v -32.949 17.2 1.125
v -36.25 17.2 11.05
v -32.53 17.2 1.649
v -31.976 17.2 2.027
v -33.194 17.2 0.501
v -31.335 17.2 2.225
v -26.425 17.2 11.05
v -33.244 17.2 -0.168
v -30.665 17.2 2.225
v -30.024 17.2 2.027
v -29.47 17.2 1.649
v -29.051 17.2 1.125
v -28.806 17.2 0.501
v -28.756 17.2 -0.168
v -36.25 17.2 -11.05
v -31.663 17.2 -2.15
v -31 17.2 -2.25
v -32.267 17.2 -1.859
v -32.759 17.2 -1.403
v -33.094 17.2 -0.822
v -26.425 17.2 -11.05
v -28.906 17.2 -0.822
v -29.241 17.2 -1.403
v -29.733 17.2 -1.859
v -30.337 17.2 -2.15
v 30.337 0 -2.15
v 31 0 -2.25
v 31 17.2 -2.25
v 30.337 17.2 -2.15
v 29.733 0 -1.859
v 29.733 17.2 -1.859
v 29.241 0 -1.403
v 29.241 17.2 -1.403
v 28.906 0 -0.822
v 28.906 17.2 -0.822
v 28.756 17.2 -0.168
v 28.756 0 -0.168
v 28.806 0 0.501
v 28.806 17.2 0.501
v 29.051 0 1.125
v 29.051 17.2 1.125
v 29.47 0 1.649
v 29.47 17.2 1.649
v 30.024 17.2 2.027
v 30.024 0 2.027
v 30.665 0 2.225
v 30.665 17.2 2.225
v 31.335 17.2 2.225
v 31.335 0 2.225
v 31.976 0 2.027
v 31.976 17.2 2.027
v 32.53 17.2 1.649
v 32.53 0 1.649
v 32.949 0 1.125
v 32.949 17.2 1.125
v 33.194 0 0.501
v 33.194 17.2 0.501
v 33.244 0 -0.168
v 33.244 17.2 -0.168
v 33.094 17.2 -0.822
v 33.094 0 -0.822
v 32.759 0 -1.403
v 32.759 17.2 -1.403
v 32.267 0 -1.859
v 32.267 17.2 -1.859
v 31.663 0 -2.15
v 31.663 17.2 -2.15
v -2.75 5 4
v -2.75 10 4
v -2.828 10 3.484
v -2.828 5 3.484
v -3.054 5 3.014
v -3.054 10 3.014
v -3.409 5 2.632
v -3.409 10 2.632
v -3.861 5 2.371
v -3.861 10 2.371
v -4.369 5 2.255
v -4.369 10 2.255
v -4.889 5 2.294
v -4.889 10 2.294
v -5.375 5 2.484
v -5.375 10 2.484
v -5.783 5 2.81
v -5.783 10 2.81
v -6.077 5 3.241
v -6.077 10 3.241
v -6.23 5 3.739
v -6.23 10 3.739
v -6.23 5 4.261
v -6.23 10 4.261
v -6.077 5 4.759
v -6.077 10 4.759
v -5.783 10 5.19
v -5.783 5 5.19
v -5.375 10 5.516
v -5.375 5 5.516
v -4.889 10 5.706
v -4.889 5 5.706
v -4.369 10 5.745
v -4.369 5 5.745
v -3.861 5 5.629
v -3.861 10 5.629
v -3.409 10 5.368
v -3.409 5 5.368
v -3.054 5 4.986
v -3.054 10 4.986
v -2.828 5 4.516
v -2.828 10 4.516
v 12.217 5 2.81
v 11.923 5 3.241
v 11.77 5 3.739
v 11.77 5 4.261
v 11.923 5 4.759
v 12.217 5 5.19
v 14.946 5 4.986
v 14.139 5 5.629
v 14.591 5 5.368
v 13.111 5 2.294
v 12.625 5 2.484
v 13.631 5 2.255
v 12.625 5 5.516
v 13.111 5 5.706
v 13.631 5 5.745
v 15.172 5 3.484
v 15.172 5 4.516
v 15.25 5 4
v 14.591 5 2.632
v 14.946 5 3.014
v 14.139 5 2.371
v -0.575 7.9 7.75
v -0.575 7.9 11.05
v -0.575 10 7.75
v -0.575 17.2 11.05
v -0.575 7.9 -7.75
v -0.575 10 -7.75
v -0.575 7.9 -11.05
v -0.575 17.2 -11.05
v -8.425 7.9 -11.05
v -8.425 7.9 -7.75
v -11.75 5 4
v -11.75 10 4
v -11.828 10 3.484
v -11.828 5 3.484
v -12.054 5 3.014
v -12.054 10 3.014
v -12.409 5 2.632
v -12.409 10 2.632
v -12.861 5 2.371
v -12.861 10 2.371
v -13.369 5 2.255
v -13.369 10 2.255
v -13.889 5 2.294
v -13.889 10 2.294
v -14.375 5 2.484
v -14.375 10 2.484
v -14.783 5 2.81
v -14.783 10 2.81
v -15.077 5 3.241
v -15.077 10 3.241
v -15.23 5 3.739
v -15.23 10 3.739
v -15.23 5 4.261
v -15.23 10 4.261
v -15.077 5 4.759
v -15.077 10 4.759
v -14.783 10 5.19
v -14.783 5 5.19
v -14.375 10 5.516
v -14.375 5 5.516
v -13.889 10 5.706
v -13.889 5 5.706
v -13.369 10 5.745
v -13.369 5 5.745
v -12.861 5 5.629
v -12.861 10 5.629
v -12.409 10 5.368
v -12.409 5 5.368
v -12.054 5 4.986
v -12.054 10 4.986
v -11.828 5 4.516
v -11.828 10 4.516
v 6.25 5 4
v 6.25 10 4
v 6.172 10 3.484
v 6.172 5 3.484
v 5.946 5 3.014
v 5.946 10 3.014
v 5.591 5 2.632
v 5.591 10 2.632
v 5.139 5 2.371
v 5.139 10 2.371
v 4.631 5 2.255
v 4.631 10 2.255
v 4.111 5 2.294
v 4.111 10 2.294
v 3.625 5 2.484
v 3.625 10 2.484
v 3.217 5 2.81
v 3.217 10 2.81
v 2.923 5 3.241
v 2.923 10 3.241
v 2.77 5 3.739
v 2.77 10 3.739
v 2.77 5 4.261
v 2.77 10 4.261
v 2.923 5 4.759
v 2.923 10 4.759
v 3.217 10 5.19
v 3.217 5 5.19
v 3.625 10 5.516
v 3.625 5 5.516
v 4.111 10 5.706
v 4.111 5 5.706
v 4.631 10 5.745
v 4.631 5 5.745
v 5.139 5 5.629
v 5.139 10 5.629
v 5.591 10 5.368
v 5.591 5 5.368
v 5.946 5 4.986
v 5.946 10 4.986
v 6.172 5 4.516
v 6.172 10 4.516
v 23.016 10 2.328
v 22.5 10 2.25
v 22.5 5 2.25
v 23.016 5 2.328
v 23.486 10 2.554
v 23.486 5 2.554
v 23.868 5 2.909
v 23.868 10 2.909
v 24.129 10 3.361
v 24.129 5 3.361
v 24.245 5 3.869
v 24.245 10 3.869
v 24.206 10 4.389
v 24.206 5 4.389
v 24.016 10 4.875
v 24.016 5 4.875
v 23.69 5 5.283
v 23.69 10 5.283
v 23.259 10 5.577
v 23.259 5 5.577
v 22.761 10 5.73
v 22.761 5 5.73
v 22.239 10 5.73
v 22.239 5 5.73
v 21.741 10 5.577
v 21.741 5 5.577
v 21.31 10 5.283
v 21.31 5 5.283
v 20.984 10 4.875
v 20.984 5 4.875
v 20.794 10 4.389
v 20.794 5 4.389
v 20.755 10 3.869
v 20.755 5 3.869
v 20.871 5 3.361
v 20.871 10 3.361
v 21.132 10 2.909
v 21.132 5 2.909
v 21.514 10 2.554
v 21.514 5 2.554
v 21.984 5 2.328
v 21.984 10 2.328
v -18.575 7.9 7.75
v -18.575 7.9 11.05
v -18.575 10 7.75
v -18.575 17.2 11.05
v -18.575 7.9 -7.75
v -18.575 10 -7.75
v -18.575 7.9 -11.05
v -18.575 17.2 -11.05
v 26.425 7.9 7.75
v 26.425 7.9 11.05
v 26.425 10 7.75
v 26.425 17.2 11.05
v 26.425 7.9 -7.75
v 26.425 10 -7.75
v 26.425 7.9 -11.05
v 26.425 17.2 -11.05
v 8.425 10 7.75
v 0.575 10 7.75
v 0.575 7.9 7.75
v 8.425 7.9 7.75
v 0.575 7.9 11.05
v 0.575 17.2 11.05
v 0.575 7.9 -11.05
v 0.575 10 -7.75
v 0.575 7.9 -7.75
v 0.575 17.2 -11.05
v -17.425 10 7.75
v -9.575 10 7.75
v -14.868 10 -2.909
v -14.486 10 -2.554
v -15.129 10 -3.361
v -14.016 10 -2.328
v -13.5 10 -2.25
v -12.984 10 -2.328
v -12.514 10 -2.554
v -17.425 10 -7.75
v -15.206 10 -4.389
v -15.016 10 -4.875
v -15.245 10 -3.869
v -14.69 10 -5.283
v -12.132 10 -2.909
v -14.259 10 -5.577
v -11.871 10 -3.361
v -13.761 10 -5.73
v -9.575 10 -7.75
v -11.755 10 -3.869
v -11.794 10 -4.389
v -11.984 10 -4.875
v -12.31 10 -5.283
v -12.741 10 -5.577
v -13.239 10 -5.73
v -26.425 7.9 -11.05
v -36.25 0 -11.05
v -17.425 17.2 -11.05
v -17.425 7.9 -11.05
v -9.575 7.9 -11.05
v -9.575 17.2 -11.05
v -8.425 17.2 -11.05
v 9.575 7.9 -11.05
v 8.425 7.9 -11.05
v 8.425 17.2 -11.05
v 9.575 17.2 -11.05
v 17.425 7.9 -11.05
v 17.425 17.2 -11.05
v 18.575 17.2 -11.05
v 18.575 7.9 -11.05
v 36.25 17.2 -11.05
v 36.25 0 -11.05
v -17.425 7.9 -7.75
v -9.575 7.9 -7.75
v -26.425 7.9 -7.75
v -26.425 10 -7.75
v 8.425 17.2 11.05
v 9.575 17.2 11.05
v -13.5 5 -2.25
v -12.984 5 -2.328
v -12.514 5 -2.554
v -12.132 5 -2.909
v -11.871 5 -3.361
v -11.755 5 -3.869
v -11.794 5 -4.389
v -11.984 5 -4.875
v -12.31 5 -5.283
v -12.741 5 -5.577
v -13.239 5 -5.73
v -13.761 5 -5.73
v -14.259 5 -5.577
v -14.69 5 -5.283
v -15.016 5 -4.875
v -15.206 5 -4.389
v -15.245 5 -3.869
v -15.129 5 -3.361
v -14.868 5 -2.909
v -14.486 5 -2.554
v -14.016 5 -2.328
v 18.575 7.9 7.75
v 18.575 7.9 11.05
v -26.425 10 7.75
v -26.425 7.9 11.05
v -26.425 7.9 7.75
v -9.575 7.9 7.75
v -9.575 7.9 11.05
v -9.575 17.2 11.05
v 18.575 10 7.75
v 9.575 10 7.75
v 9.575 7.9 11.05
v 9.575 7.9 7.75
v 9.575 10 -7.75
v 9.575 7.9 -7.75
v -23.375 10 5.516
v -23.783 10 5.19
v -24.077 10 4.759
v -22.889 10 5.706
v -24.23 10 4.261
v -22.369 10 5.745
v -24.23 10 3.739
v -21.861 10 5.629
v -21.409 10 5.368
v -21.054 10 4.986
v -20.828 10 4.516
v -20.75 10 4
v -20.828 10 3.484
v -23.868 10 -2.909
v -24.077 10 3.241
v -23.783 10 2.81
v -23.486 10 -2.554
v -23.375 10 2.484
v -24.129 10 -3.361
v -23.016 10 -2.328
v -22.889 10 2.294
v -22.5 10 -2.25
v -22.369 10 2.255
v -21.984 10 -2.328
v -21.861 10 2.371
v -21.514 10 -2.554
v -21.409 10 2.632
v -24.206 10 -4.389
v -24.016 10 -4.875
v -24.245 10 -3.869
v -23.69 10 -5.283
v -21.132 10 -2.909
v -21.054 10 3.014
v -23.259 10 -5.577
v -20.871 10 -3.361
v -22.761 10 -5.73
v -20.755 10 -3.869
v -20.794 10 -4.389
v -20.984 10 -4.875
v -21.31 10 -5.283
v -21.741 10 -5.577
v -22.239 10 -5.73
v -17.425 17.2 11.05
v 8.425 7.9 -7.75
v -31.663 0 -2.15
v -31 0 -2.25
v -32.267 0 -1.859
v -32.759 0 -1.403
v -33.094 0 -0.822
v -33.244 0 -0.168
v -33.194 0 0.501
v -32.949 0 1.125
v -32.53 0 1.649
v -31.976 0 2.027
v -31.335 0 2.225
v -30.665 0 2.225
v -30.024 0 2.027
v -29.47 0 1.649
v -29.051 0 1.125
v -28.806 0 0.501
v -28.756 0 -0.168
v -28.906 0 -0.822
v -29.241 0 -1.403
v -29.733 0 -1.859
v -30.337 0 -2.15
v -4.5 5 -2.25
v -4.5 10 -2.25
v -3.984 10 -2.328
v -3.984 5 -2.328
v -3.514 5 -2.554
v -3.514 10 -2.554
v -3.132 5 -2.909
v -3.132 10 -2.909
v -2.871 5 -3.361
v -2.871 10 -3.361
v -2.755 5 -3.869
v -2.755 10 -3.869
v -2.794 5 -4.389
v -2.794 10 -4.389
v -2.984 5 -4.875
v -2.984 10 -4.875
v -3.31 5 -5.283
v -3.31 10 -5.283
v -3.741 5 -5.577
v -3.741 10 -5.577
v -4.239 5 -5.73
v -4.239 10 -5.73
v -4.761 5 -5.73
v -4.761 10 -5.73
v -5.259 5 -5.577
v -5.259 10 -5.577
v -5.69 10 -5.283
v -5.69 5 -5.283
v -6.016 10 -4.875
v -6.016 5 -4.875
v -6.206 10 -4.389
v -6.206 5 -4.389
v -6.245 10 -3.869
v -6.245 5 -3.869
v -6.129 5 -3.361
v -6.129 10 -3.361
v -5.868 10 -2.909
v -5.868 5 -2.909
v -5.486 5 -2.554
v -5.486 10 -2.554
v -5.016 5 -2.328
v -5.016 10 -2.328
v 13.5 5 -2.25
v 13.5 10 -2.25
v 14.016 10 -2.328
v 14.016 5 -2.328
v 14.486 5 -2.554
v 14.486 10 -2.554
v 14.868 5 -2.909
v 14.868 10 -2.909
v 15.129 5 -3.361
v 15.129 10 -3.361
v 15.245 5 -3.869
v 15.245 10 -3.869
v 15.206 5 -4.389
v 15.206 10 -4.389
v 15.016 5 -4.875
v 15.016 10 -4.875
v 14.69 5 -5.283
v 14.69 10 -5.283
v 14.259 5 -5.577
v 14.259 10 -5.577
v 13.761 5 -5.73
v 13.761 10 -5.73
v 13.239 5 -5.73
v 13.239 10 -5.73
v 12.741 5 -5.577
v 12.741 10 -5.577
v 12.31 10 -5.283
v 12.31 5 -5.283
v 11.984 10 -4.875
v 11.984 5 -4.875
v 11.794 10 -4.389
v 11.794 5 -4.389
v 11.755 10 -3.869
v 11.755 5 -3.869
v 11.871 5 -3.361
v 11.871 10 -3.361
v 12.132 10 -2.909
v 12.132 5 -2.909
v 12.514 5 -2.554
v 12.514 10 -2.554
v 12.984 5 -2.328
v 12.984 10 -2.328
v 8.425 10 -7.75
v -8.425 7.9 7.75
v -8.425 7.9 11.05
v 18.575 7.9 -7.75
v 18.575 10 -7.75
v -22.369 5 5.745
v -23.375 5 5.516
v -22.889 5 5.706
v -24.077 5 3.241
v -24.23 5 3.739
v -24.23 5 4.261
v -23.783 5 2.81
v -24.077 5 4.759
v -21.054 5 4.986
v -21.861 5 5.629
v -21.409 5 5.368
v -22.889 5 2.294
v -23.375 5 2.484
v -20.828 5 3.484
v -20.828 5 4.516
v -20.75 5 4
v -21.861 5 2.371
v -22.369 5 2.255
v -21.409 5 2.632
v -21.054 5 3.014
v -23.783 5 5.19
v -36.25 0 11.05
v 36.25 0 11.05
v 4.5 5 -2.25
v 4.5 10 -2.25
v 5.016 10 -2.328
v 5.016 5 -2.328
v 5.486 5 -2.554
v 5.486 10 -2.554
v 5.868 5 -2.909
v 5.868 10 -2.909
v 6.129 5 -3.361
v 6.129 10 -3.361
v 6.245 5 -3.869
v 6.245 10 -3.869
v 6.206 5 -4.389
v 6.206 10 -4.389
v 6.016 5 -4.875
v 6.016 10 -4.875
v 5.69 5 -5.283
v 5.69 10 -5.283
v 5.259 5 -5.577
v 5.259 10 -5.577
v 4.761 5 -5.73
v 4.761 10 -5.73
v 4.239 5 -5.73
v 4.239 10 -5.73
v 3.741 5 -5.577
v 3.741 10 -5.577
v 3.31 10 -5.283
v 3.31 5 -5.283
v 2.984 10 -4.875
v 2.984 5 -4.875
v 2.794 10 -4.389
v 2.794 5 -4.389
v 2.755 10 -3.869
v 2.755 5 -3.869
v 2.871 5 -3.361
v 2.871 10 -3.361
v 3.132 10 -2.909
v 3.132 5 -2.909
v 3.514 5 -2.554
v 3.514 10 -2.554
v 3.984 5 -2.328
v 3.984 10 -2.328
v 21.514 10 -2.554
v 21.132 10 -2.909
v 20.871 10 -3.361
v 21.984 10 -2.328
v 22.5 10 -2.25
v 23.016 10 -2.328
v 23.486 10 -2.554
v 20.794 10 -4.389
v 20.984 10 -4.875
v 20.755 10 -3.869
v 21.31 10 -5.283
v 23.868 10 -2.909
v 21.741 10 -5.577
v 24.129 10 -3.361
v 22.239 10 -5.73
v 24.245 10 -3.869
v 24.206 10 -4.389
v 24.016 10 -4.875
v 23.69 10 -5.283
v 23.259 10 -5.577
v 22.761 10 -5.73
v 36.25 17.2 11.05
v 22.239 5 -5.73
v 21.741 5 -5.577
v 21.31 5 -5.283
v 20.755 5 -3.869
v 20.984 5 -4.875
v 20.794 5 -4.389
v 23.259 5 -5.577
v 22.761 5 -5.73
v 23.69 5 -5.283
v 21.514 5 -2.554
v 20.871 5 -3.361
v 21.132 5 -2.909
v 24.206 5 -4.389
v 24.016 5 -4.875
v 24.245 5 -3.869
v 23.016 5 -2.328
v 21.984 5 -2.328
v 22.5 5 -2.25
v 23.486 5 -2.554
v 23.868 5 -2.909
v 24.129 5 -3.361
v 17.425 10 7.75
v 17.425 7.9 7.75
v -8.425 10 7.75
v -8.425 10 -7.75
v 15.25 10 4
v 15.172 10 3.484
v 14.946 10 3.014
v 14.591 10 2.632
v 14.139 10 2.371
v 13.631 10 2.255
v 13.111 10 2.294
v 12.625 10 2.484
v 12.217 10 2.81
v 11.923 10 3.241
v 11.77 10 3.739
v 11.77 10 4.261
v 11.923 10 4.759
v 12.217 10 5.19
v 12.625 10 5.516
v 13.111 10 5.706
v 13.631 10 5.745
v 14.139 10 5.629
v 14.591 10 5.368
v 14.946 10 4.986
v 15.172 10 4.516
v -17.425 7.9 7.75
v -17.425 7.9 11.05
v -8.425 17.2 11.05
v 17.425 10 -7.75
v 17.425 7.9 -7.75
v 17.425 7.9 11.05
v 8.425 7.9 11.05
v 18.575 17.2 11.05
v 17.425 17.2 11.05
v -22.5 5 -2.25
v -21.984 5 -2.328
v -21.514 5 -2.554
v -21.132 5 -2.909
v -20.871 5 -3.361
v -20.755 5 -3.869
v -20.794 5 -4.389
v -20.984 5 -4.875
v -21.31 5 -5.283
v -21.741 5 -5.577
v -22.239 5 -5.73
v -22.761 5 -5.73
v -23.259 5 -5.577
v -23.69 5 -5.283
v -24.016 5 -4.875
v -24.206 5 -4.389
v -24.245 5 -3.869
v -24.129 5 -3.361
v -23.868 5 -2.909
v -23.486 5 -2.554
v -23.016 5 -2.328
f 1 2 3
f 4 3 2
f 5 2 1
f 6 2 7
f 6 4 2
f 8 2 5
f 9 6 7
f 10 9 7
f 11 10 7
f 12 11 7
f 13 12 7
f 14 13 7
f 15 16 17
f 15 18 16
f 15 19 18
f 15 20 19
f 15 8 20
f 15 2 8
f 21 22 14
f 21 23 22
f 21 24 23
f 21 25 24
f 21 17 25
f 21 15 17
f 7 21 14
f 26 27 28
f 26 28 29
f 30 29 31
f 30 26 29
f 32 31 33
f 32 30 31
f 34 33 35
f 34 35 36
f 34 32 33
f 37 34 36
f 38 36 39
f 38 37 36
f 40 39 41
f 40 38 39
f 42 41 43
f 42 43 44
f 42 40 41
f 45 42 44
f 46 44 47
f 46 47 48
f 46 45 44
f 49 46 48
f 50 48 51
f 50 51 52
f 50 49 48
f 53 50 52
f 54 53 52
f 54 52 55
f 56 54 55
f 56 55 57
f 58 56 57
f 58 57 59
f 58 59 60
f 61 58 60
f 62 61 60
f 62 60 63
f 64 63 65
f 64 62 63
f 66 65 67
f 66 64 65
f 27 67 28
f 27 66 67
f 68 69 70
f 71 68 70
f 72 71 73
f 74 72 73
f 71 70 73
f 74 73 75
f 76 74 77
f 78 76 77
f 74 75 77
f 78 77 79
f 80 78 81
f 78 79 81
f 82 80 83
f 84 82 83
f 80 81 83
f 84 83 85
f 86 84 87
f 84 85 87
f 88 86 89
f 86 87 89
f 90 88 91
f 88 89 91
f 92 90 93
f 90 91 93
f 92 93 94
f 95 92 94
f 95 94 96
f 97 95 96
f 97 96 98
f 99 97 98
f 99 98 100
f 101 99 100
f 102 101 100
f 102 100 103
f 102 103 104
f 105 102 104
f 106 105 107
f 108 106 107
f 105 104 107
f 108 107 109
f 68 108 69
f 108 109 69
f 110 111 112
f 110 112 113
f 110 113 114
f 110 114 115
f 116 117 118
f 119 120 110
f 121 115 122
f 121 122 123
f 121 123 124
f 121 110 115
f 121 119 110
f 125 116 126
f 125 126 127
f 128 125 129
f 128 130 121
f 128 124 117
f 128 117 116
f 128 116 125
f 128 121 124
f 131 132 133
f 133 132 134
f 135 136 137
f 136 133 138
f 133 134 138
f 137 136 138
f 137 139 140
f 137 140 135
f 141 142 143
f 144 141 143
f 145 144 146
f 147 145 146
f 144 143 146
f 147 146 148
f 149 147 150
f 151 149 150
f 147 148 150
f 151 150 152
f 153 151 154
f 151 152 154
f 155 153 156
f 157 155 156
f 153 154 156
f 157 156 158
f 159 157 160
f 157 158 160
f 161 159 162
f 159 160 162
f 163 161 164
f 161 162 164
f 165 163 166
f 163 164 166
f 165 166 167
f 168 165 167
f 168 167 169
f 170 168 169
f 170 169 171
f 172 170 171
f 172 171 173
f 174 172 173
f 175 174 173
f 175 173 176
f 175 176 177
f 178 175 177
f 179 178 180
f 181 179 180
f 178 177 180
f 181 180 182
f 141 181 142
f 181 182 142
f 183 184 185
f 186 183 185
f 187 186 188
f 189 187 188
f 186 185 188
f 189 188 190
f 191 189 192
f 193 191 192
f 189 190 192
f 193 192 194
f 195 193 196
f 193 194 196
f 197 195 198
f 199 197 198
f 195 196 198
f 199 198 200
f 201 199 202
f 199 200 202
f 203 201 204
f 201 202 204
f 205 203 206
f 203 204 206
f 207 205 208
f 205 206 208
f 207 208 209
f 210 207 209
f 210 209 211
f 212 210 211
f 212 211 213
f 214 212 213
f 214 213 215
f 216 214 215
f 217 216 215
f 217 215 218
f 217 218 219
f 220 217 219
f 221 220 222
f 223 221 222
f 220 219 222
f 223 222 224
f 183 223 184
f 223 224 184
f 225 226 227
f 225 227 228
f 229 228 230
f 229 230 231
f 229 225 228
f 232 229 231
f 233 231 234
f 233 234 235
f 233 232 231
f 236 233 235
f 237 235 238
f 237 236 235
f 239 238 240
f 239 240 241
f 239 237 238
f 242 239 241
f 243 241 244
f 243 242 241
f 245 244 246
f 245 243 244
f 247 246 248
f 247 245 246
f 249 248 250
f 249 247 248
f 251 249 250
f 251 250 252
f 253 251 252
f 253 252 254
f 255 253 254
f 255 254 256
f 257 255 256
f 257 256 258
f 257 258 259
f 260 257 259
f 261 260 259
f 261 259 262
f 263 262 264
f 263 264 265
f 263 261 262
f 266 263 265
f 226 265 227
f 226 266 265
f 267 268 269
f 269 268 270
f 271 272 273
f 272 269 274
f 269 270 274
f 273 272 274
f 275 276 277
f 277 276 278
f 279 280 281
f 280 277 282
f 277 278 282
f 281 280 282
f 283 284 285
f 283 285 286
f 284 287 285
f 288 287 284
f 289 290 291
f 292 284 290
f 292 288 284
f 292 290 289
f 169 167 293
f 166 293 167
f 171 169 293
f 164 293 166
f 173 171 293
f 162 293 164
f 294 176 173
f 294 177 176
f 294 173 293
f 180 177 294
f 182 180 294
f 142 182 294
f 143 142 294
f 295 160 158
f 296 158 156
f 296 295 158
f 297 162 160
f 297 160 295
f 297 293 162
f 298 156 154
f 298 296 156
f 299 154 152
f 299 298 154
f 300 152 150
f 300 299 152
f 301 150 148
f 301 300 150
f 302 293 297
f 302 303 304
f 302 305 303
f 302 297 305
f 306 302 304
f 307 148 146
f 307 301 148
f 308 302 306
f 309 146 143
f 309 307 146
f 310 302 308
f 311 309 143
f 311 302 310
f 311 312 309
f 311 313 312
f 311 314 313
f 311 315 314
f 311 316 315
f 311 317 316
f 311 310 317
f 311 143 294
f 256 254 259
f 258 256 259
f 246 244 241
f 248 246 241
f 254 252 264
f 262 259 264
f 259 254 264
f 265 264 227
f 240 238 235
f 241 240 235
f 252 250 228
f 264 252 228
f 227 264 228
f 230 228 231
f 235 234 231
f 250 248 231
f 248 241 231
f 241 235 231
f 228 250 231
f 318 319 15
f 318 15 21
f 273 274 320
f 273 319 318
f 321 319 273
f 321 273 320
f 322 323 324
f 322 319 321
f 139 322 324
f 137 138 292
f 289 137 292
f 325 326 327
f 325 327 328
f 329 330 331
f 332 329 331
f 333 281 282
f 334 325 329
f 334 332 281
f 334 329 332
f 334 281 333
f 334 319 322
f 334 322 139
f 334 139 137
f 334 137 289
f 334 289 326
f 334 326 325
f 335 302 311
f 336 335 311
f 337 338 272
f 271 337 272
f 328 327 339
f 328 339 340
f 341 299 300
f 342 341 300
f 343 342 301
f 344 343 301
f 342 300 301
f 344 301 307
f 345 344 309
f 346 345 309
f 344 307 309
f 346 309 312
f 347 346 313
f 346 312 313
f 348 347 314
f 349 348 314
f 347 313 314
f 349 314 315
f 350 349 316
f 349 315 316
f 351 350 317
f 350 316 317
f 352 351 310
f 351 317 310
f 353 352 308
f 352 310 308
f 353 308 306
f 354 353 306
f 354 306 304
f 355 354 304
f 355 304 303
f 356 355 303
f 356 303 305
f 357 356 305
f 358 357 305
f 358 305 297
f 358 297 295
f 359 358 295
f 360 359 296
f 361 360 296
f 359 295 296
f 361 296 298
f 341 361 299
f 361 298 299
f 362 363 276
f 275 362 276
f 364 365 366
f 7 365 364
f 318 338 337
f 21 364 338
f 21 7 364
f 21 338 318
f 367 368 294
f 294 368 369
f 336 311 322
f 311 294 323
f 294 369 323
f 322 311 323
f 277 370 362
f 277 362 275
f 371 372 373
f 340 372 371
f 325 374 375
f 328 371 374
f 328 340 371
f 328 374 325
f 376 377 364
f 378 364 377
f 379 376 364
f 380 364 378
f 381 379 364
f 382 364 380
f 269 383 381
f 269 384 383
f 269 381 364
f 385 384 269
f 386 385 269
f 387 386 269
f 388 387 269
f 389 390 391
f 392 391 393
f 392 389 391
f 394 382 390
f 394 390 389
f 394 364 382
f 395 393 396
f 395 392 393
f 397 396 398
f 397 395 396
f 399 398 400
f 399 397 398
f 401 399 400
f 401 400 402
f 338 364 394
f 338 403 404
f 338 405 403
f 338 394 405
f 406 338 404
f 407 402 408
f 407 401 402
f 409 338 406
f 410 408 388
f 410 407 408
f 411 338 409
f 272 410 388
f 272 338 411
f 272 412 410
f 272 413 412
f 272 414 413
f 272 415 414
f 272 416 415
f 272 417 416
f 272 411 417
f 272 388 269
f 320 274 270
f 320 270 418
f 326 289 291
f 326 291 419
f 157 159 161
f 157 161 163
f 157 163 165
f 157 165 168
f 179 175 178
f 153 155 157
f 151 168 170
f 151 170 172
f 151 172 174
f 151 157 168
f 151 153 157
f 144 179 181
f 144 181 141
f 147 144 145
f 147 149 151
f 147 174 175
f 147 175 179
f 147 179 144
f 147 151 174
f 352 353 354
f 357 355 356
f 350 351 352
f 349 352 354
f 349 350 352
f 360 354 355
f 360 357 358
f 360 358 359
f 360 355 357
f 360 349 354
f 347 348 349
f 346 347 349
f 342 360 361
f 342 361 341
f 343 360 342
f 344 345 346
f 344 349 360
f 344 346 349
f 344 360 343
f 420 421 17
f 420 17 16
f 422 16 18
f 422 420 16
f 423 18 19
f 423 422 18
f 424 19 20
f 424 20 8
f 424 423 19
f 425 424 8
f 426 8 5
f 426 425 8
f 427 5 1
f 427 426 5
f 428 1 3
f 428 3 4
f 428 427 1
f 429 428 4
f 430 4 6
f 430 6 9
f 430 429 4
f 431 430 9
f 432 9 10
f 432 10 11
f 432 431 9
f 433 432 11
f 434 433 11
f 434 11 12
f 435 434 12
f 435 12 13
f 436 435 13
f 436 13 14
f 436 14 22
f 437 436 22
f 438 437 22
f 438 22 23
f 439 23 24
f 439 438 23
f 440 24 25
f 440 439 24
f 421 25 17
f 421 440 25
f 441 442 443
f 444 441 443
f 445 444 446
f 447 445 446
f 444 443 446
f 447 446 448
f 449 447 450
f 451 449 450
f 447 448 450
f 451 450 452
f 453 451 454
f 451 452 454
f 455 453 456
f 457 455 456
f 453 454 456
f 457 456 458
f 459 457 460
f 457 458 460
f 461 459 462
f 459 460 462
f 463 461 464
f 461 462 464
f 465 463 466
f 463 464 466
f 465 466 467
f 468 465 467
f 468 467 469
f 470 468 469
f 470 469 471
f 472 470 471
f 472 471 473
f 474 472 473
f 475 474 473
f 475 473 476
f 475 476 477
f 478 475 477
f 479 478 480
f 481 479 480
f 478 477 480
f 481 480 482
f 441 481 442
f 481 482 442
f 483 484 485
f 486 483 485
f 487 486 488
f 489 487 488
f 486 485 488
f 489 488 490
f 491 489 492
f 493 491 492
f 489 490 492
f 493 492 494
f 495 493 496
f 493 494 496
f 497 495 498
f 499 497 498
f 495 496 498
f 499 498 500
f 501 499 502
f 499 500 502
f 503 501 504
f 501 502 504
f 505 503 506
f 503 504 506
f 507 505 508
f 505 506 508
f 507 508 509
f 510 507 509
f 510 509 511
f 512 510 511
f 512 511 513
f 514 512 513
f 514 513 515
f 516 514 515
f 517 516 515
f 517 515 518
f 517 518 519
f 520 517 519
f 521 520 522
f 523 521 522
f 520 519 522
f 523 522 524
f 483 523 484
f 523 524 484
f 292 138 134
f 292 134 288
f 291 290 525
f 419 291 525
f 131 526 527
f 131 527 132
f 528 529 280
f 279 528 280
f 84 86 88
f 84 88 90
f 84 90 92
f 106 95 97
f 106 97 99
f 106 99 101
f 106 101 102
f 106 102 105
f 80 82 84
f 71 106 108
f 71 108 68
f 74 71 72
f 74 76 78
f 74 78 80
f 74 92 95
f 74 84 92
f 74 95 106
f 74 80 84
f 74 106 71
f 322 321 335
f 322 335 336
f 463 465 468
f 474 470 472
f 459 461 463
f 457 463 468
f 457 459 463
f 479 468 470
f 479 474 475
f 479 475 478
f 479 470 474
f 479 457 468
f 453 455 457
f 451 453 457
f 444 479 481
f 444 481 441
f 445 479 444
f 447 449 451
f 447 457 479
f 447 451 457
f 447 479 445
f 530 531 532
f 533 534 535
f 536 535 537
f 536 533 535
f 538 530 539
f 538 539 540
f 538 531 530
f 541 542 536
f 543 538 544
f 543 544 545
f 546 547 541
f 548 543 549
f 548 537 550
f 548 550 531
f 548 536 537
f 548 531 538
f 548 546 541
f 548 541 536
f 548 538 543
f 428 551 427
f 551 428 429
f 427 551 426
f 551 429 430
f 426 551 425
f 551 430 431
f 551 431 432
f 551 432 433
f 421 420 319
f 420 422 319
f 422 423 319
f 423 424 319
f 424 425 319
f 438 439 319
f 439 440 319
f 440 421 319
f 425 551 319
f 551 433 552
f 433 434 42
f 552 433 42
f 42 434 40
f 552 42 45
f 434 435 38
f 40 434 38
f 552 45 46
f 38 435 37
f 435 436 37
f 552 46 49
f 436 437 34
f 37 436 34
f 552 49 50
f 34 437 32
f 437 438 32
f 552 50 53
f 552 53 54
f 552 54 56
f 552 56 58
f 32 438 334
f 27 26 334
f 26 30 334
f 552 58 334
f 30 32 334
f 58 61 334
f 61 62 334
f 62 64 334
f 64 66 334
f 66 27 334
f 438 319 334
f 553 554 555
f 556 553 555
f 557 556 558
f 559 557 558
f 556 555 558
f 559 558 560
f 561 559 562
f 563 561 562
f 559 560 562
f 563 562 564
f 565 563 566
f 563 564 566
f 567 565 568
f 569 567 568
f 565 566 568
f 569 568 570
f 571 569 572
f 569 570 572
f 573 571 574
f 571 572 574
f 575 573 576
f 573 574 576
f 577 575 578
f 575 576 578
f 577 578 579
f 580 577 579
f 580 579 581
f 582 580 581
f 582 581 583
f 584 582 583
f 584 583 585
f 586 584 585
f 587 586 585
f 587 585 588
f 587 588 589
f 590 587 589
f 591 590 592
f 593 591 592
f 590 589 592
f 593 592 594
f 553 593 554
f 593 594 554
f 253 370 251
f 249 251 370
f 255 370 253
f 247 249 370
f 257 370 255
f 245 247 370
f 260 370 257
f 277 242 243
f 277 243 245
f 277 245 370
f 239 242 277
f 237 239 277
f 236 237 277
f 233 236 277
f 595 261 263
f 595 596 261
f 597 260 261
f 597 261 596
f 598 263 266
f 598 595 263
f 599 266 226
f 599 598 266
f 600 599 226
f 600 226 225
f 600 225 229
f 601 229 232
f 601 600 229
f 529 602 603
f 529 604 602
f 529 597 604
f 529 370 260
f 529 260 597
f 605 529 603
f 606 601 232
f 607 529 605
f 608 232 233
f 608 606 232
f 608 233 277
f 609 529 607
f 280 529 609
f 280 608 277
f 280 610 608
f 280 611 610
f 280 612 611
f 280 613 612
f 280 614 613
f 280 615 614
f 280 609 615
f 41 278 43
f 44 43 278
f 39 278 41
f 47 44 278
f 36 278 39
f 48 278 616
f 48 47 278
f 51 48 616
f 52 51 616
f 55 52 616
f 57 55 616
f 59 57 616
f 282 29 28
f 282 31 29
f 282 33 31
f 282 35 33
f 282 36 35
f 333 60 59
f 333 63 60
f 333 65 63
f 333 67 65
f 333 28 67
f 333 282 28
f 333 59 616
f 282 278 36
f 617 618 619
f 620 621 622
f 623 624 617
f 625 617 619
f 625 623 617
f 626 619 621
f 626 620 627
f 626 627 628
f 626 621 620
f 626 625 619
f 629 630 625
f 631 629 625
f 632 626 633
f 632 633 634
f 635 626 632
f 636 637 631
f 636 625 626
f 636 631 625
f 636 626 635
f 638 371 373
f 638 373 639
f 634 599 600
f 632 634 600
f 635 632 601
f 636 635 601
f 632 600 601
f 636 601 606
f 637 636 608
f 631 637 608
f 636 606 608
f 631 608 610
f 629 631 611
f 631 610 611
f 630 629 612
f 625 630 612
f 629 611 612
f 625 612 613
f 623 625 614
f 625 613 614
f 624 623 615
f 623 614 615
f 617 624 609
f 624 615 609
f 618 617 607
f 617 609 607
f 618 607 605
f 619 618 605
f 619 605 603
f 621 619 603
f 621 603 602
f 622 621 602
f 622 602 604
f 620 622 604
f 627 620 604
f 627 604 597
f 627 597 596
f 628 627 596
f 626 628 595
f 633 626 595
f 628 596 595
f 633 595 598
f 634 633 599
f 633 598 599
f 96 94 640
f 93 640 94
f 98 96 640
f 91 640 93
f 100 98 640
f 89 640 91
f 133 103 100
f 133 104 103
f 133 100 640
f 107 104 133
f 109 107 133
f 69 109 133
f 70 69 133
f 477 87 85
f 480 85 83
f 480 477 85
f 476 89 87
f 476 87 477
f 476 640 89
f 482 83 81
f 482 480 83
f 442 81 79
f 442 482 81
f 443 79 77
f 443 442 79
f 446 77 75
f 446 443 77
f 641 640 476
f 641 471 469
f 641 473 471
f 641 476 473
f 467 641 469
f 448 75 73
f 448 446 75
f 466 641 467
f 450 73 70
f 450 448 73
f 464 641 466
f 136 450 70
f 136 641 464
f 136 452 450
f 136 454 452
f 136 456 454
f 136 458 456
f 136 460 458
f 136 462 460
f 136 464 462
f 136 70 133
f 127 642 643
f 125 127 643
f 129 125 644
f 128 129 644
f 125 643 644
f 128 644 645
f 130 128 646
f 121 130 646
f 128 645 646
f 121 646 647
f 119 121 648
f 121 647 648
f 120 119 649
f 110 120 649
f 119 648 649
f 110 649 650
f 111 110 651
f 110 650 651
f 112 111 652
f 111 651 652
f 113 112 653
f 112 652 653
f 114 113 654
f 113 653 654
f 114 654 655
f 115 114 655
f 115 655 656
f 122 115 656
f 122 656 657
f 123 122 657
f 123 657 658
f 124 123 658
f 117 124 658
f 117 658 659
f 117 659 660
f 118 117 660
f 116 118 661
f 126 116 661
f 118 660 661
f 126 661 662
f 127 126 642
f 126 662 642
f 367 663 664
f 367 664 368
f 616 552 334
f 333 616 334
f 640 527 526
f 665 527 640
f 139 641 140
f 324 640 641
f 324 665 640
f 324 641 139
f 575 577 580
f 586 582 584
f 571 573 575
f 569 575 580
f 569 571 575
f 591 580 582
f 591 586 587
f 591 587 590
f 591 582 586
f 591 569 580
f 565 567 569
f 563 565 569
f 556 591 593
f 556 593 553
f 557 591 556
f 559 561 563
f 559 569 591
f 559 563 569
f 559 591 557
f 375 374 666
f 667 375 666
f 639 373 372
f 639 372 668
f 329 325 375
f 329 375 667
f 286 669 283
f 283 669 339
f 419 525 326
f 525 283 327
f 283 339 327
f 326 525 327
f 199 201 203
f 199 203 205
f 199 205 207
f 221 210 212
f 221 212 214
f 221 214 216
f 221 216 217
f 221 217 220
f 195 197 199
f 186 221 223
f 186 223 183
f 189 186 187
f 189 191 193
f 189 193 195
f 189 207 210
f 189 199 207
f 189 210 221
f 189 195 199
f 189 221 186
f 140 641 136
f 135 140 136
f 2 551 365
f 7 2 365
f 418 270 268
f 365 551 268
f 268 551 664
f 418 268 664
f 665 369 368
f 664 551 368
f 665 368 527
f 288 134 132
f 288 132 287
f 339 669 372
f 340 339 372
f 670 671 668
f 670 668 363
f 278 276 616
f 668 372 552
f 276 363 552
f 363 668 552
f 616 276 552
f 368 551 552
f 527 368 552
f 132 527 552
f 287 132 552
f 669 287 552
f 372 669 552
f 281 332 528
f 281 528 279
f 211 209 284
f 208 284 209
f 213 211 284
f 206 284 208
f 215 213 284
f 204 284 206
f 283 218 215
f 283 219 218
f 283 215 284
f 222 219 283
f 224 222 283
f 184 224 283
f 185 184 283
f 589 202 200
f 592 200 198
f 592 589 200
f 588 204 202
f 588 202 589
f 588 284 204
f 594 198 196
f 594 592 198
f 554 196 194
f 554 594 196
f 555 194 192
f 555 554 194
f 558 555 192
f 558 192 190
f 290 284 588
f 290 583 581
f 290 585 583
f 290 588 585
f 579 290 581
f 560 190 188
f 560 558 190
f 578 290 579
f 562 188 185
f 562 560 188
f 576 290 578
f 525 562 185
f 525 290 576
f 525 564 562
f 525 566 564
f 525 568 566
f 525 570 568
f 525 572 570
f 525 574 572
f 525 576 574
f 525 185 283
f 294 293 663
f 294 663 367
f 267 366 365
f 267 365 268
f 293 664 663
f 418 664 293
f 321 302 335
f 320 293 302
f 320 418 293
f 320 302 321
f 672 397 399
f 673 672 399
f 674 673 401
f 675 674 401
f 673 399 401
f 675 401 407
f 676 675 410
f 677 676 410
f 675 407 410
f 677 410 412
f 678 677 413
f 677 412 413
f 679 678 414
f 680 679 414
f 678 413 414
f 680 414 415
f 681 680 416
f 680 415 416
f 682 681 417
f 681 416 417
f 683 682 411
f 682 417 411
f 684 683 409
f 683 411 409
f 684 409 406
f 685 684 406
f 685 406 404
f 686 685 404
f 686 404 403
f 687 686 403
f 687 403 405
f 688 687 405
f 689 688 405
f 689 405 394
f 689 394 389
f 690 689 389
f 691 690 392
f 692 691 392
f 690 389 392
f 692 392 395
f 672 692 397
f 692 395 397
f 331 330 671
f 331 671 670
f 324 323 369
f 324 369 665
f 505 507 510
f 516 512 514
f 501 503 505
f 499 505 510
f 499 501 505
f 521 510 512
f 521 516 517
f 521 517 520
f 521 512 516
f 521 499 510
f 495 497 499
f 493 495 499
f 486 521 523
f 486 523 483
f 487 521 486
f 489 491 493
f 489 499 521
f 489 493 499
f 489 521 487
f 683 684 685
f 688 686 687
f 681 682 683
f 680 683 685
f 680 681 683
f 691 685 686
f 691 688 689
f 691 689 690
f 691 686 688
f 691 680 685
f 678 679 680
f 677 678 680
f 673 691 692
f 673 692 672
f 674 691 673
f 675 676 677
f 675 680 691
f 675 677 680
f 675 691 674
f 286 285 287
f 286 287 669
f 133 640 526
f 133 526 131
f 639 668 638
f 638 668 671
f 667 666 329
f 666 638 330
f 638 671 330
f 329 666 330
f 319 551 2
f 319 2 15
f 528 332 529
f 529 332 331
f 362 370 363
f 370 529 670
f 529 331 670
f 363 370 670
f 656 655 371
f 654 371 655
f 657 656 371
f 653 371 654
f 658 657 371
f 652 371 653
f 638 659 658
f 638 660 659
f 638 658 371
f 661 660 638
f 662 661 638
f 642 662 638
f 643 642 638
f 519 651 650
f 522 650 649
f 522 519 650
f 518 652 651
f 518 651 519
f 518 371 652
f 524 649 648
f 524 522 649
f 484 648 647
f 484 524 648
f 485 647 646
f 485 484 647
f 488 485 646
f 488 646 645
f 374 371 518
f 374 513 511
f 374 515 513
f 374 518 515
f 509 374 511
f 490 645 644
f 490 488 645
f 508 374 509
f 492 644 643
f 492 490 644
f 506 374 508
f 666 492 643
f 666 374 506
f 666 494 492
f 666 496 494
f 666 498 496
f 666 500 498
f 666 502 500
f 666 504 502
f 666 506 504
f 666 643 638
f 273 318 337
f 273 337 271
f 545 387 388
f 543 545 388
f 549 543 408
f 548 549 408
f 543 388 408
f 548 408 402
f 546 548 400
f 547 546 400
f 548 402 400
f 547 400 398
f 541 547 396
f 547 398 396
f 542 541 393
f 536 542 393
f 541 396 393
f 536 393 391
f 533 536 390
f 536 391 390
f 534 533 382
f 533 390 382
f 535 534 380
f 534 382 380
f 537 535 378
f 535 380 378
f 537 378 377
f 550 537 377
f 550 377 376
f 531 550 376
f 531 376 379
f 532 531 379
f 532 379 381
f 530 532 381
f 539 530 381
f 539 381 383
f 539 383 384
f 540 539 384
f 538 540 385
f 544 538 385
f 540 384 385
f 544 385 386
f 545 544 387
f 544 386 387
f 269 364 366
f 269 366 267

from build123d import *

# Parameters (mm, degrees)
SKETCH_1_W                        = 72.5
SKETCH_1_H                        = 22.1
SKETCH_1_R                        = 2.25
EXTRUDE_1_DEPTH                   = 17.2
SKETCH_2_W                        = 7.85
SKETCH_2_H                        = 22.1
CUT_EXTRUDE_1_DEPTH               = 7.2
SKETCH_3_W                        = 7.85
SKETCH_3_H                        = 3.3
CUT_EXTRUDE_2_DEPTH               = 2.1
SKETCH_4_R                        = 1.75
CUT_EXTRUDE_3_DEPTH               = 5
PATTERN_LINEAR_1_COUNT            = 6
PATTERN_LINEAR_1_PITCH            = 9
PATTERN_LINEAR_1_COPY_1_SKETCH_W  = 7.85
PATTERN_LINEAR_1_COPY_1_SKETCH_H  = 3.3
PATTERN_LINEAR_1_COPY_1_DEPTH     = 2.1
PATTERN_LINEAR_1_COPY_2_SKETCH_W  = 7.85
PATTERN_LINEAR_1_COPY_2_SKETCH_H  = 3.3
PATTERN_LINEAR_1_COPY_2_DEPTH     = 2.1
PATTERN_LINEAR_1_COPY_3_SKETCH_W  = 7.85
PATTERN_LINEAR_1_COPY_3_SKETCH_H  = 3.3
PATTERN_LINEAR_1_COPY_3_DEPTH     = 2.1
PATTERN_LINEAR_1_COPY_4_SKETCH_W  = 7.85
PATTERN_LINEAR_1_COPY_4_SKETCH_H  = 3.3
PATTERN_LINEAR_1_COPY_4_DEPTH     = 2.1
PATTERN_LINEAR_1_COPY_5_SKETCH_W  = 7.85
PATTERN_LINEAR_1_COPY_5_SKETCH_H  = 3.3
PATTERN_LINEAR_1_COPY_5_DEPTH     = 2.1
PATTERN_LINEAR_1_COPY_6_SKETCH_R  = 1.75
PATTERN_LINEAR_1_COPY_6_DEPTH     = 5
PATTERN_LINEAR_1_COPY_7_SKETCH_R  = 1.75
PATTERN_LINEAR_1_COPY_7_DEPTH     = 5
PATTERN_LINEAR_1_COPY_8_SKETCH_R  = 1.75
PATTERN_LINEAR_1_COPY_8_DEPTH     = 5
PATTERN_LINEAR_1_COPY_9_SKETCH_R  = 1.75
PATTERN_LINEAR_1_COPY_9_DEPTH     = 5
PATTERN_LINEAR_1_COPY_10_SKETCH_R = 1.75
PATTERN_LINEAR_1_COPY_10_DEPTH    = 5


with BuildPart() as part:
    # Sketch 1 → Extrude 1 (new body)
    with BuildSketch(Plane(origin=(0, 0, 0), x_dir=(1, 0, 0), z_dir=(0, 1, 0))):
        Rectangle(SKETCH_1_W, SKETCH_1_H)
        with Locations(Location((31, 0, 0), (0, 0, 90))):
            Circle(SKETCH_1_R, mode=Mode.SUBTRACT)
        with Locations(Location((-31, 0, 0), (0, 0, 90))):
            Circle(SKETCH_1_R, mode=Mode.SUBTRACT)
    extrude(amount=EXTRUDE_1_DEPTH)

    # Sketch 2 → Cut-Extrude 1 (cut)
    with BuildSketch(Plane(origin=(0, 17.2, 0), x_dir=(1, 0, 0), z_dir=(0, 1, 0))):
        with Locations((22.5, 0)):
            Rectangle(SKETCH_2_W, SKETCH_2_H)
    cut_extrude_1 = extrude(amount=-CUT_EXTRUDE_1_DEPTH, mode=Mode.SUBTRACT)

    # Sketch 3 → Cut-Extrude 2 (cut)
    with BuildSketch(Plane(origin=(0, 10, 0), x_dir=(1, 0, 0), z_dir=(0, 1, 0))):
        with Locations((22.5, 9.4)):
            Rectangle(SKETCH_3_W, SKETCH_3_H)
    cut_extrude_2 = extrude(amount=-CUT_EXTRUDE_2_DEPTH, mode=Mode.SUBTRACT)

    # Sketch 4 → Cut-Extrude 3 (cut)
    with BuildSketch(Plane(origin=(0, 10, 0), x_dir=(1, 0, 0), z_dir=(0, 1, 0))):
        with Locations(Location((22.5, 4, 0), (0, 0, 270))):
            Circle(SKETCH_4_R)
    cut_extrude_3 = extrude(amount=-CUT_EXTRUDE_3_DEPTH, mode=Mode.SUBTRACT)

    # Mirror 1: Cut-Extrude 2, Cut-Extrude 3 across plane
    add(cut_extrude_2.mirror(Plane.XY), mode=Mode.SUBTRACT)
    add(cut_extrude_3.mirror(Plane.XY), mode=Mode.SUBTRACT)

    # Pattern Linear 1: Cut-Extrude 1, Cut-Extrude 2, Cut-Extrude 3 ×6
    with Locations(*[(-i * PATTERN_LINEAR_1_PITCH, 0, 0) for i in range(1, PATTERN_LINEAR_1_COUNT)]):
        add(cut_extrude_1, mode=Mode.SUBTRACT)
        add(cut_extrude_2, mode=Mode.SUBTRACT)
        add(cut_extrude_3, mode=Mode.SUBTRACT)

    # Pattern Linear 1 copy 1 sketch → Pattern Linear 1 copy 1 (cut)
    with BuildSketch(Plane(origin=(-9, 10, 0), x_dir=(1, 0, 0), z_dir=(0, 1, 0))):
        with Locations((22.5, -9.4)):
            Rectangle(PATTERN_LINEAR_1_COPY_1_SKETCH_W, PATTERN_LINEAR_1_COPY_1_SKETCH_H)
    extrude(amount=-PATTERN_LINEAR_1_COPY_1_DEPTH, mode=Mode.SUBTRACT)

    # Pattern Linear 1 copy 2 sketch → Pattern Linear 1 copy 2 (cut)
    with BuildSketch(Plane(origin=(-18, 10, 0), x_dir=(1, 0, 0), z_dir=(0, 1, 0))):
        with Locations((22.5, -9.4)):
            Rectangle(PATTERN_LINEAR_1_COPY_2_SKETCH_W, PATTERN_LINEAR_1_COPY_2_SKETCH_H)
    extrude(amount=-PATTERN_LINEAR_1_COPY_2_DEPTH, mode=Mode.SUBTRACT)

    # Pattern Linear 1 copy 3 sketch → Pattern Linear 1 copy 3 (cut)
    with BuildSketch(Plane(origin=(-27, 10, 0), x_dir=(1, 0, 0), z_dir=(0, 1, 0))):
        with Locations((22.5, -9.4)):
            Rectangle(PATTERN_LINEAR_1_COPY_3_SKETCH_W, PATTERN_LINEAR_1_COPY_3_SKETCH_H)
    extrude(amount=-PATTERN_LINEAR_1_COPY_3_DEPTH, mode=Mode.SUBTRACT)

    # Pattern Linear 1 copy 4 sketch → Pattern Linear 1 copy 4 (cut)
    with BuildSketch(Plane(origin=(-36, 10, 0), x_dir=(1, 0, 0), z_dir=(0, 1, 0))):
        with Locations((22.5, -9.4)):
            Rectangle(PATTERN_LINEAR_1_COPY_4_SKETCH_W, PATTERN_LINEAR_1_COPY_4_SKETCH_H)
    extrude(amount=-PATTERN_LINEAR_1_COPY_4_DEPTH, mode=Mode.SUBTRACT)

    # Pattern Linear 1 copy 5 sketch → Pattern Linear 1 copy 5 (cut)
    with BuildSketch(Plane(origin=(-45, 10, 0), x_dir=(1, 0, 0), z_dir=(0, 1, 0))):
        with Locations((22.5, -9.4)):
            Rectangle(PATTERN_LINEAR_1_COPY_5_SKETCH_W, PATTERN_LINEAR_1_COPY_5_SKETCH_H)
    extrude(amount=-PATTERN_LINEAR_1_COPY_5_DEPTH, mode=Mode.SUBTRACT)

    # Pattern Linear 1 copy 6 sketch → Pattern Linear 1 copy 6 (cut)
    with BuildSketch(Plane(origin=(-9, 10, 0), x_dir=(1, 0, 0), z_dir=(0, 1, 0))):
        with Locations((22.5, -4)):
            Circle(PATTERN_LINEAR_1_COPY_6_SKETCH_R)
    extrude(amount=-PATTERN_LINEAR_1_COPY_6_DEPTH, mode=Mode.SUBTRACT)

    # Pattern Linear 1 copy 7 sketch → Pattern Linear 1 copy 7 (cut)
    with BuildSketch(Plane(origin=(-18, 10, 0), x_dir=(1, 0, 0), z_dir=(0, 1, 0))):
        with Locations((22.5, -4)):
            Circle(PATTERN_LINEAR_1_COPY_7_SKETCH_R)
    extrude(amount=-PATTERN_LINEAR_1_COPY_7_DEPTH, mode=Mode.SUBTRACT)

    # Pattern Linear 1 copy 8 sketch → Pattern Linear 1 copy 8 (cut)
    with BuildSketch(Plane(origin=(-27, 10, 0), x_dir=(1, 0, 0), z_dir=(0, 1, 0))):
        with Locations((22.5, -4)):
            Circle(PATTERN_LINEAR_1_COPY_8_SKETCH_R)
    extrude(amount=-PATTERN_LINEAR_1_COPY_8_DEPTH, mode=Mode.SUBTRACT)

    # Pattern Linear 1 copy 9 sketch → Pattern Linear 1 copy 9 (cut)
    with BuildSketch(Plane(origin=(-36, 10, 0), x_dir=(1, 0, 0), z_dir=(0, 1, 0))):
        with Locations((22.5, -4)):
            Circle(PATTERN_LINEAR_1_COPY_9_SKETCH_R)
    extrude(amount=-PATTERN_LINEAR_1_COPY_9_DEPTH, mode=Mode.SUBTRACT)

    # Pattern Linear 1 copy 10 sketch → Pattern Linear 1 copy 10 (cut)
    with BuildSketch(Plane(origin=(-45, 10, 0), x_dir=(1, 0, 0), z_dir=(0, 1, 0))):
        with Locations((22.5, -4)):
            Circle(PATTERN_LINEAR_1_COPY_10_SKETCH_R)
    extrude(amount=-PATTERN_LINEAR_1_COPY_10_DEPTH, mode=Mode.SUBTRACT)


solid = part.part
